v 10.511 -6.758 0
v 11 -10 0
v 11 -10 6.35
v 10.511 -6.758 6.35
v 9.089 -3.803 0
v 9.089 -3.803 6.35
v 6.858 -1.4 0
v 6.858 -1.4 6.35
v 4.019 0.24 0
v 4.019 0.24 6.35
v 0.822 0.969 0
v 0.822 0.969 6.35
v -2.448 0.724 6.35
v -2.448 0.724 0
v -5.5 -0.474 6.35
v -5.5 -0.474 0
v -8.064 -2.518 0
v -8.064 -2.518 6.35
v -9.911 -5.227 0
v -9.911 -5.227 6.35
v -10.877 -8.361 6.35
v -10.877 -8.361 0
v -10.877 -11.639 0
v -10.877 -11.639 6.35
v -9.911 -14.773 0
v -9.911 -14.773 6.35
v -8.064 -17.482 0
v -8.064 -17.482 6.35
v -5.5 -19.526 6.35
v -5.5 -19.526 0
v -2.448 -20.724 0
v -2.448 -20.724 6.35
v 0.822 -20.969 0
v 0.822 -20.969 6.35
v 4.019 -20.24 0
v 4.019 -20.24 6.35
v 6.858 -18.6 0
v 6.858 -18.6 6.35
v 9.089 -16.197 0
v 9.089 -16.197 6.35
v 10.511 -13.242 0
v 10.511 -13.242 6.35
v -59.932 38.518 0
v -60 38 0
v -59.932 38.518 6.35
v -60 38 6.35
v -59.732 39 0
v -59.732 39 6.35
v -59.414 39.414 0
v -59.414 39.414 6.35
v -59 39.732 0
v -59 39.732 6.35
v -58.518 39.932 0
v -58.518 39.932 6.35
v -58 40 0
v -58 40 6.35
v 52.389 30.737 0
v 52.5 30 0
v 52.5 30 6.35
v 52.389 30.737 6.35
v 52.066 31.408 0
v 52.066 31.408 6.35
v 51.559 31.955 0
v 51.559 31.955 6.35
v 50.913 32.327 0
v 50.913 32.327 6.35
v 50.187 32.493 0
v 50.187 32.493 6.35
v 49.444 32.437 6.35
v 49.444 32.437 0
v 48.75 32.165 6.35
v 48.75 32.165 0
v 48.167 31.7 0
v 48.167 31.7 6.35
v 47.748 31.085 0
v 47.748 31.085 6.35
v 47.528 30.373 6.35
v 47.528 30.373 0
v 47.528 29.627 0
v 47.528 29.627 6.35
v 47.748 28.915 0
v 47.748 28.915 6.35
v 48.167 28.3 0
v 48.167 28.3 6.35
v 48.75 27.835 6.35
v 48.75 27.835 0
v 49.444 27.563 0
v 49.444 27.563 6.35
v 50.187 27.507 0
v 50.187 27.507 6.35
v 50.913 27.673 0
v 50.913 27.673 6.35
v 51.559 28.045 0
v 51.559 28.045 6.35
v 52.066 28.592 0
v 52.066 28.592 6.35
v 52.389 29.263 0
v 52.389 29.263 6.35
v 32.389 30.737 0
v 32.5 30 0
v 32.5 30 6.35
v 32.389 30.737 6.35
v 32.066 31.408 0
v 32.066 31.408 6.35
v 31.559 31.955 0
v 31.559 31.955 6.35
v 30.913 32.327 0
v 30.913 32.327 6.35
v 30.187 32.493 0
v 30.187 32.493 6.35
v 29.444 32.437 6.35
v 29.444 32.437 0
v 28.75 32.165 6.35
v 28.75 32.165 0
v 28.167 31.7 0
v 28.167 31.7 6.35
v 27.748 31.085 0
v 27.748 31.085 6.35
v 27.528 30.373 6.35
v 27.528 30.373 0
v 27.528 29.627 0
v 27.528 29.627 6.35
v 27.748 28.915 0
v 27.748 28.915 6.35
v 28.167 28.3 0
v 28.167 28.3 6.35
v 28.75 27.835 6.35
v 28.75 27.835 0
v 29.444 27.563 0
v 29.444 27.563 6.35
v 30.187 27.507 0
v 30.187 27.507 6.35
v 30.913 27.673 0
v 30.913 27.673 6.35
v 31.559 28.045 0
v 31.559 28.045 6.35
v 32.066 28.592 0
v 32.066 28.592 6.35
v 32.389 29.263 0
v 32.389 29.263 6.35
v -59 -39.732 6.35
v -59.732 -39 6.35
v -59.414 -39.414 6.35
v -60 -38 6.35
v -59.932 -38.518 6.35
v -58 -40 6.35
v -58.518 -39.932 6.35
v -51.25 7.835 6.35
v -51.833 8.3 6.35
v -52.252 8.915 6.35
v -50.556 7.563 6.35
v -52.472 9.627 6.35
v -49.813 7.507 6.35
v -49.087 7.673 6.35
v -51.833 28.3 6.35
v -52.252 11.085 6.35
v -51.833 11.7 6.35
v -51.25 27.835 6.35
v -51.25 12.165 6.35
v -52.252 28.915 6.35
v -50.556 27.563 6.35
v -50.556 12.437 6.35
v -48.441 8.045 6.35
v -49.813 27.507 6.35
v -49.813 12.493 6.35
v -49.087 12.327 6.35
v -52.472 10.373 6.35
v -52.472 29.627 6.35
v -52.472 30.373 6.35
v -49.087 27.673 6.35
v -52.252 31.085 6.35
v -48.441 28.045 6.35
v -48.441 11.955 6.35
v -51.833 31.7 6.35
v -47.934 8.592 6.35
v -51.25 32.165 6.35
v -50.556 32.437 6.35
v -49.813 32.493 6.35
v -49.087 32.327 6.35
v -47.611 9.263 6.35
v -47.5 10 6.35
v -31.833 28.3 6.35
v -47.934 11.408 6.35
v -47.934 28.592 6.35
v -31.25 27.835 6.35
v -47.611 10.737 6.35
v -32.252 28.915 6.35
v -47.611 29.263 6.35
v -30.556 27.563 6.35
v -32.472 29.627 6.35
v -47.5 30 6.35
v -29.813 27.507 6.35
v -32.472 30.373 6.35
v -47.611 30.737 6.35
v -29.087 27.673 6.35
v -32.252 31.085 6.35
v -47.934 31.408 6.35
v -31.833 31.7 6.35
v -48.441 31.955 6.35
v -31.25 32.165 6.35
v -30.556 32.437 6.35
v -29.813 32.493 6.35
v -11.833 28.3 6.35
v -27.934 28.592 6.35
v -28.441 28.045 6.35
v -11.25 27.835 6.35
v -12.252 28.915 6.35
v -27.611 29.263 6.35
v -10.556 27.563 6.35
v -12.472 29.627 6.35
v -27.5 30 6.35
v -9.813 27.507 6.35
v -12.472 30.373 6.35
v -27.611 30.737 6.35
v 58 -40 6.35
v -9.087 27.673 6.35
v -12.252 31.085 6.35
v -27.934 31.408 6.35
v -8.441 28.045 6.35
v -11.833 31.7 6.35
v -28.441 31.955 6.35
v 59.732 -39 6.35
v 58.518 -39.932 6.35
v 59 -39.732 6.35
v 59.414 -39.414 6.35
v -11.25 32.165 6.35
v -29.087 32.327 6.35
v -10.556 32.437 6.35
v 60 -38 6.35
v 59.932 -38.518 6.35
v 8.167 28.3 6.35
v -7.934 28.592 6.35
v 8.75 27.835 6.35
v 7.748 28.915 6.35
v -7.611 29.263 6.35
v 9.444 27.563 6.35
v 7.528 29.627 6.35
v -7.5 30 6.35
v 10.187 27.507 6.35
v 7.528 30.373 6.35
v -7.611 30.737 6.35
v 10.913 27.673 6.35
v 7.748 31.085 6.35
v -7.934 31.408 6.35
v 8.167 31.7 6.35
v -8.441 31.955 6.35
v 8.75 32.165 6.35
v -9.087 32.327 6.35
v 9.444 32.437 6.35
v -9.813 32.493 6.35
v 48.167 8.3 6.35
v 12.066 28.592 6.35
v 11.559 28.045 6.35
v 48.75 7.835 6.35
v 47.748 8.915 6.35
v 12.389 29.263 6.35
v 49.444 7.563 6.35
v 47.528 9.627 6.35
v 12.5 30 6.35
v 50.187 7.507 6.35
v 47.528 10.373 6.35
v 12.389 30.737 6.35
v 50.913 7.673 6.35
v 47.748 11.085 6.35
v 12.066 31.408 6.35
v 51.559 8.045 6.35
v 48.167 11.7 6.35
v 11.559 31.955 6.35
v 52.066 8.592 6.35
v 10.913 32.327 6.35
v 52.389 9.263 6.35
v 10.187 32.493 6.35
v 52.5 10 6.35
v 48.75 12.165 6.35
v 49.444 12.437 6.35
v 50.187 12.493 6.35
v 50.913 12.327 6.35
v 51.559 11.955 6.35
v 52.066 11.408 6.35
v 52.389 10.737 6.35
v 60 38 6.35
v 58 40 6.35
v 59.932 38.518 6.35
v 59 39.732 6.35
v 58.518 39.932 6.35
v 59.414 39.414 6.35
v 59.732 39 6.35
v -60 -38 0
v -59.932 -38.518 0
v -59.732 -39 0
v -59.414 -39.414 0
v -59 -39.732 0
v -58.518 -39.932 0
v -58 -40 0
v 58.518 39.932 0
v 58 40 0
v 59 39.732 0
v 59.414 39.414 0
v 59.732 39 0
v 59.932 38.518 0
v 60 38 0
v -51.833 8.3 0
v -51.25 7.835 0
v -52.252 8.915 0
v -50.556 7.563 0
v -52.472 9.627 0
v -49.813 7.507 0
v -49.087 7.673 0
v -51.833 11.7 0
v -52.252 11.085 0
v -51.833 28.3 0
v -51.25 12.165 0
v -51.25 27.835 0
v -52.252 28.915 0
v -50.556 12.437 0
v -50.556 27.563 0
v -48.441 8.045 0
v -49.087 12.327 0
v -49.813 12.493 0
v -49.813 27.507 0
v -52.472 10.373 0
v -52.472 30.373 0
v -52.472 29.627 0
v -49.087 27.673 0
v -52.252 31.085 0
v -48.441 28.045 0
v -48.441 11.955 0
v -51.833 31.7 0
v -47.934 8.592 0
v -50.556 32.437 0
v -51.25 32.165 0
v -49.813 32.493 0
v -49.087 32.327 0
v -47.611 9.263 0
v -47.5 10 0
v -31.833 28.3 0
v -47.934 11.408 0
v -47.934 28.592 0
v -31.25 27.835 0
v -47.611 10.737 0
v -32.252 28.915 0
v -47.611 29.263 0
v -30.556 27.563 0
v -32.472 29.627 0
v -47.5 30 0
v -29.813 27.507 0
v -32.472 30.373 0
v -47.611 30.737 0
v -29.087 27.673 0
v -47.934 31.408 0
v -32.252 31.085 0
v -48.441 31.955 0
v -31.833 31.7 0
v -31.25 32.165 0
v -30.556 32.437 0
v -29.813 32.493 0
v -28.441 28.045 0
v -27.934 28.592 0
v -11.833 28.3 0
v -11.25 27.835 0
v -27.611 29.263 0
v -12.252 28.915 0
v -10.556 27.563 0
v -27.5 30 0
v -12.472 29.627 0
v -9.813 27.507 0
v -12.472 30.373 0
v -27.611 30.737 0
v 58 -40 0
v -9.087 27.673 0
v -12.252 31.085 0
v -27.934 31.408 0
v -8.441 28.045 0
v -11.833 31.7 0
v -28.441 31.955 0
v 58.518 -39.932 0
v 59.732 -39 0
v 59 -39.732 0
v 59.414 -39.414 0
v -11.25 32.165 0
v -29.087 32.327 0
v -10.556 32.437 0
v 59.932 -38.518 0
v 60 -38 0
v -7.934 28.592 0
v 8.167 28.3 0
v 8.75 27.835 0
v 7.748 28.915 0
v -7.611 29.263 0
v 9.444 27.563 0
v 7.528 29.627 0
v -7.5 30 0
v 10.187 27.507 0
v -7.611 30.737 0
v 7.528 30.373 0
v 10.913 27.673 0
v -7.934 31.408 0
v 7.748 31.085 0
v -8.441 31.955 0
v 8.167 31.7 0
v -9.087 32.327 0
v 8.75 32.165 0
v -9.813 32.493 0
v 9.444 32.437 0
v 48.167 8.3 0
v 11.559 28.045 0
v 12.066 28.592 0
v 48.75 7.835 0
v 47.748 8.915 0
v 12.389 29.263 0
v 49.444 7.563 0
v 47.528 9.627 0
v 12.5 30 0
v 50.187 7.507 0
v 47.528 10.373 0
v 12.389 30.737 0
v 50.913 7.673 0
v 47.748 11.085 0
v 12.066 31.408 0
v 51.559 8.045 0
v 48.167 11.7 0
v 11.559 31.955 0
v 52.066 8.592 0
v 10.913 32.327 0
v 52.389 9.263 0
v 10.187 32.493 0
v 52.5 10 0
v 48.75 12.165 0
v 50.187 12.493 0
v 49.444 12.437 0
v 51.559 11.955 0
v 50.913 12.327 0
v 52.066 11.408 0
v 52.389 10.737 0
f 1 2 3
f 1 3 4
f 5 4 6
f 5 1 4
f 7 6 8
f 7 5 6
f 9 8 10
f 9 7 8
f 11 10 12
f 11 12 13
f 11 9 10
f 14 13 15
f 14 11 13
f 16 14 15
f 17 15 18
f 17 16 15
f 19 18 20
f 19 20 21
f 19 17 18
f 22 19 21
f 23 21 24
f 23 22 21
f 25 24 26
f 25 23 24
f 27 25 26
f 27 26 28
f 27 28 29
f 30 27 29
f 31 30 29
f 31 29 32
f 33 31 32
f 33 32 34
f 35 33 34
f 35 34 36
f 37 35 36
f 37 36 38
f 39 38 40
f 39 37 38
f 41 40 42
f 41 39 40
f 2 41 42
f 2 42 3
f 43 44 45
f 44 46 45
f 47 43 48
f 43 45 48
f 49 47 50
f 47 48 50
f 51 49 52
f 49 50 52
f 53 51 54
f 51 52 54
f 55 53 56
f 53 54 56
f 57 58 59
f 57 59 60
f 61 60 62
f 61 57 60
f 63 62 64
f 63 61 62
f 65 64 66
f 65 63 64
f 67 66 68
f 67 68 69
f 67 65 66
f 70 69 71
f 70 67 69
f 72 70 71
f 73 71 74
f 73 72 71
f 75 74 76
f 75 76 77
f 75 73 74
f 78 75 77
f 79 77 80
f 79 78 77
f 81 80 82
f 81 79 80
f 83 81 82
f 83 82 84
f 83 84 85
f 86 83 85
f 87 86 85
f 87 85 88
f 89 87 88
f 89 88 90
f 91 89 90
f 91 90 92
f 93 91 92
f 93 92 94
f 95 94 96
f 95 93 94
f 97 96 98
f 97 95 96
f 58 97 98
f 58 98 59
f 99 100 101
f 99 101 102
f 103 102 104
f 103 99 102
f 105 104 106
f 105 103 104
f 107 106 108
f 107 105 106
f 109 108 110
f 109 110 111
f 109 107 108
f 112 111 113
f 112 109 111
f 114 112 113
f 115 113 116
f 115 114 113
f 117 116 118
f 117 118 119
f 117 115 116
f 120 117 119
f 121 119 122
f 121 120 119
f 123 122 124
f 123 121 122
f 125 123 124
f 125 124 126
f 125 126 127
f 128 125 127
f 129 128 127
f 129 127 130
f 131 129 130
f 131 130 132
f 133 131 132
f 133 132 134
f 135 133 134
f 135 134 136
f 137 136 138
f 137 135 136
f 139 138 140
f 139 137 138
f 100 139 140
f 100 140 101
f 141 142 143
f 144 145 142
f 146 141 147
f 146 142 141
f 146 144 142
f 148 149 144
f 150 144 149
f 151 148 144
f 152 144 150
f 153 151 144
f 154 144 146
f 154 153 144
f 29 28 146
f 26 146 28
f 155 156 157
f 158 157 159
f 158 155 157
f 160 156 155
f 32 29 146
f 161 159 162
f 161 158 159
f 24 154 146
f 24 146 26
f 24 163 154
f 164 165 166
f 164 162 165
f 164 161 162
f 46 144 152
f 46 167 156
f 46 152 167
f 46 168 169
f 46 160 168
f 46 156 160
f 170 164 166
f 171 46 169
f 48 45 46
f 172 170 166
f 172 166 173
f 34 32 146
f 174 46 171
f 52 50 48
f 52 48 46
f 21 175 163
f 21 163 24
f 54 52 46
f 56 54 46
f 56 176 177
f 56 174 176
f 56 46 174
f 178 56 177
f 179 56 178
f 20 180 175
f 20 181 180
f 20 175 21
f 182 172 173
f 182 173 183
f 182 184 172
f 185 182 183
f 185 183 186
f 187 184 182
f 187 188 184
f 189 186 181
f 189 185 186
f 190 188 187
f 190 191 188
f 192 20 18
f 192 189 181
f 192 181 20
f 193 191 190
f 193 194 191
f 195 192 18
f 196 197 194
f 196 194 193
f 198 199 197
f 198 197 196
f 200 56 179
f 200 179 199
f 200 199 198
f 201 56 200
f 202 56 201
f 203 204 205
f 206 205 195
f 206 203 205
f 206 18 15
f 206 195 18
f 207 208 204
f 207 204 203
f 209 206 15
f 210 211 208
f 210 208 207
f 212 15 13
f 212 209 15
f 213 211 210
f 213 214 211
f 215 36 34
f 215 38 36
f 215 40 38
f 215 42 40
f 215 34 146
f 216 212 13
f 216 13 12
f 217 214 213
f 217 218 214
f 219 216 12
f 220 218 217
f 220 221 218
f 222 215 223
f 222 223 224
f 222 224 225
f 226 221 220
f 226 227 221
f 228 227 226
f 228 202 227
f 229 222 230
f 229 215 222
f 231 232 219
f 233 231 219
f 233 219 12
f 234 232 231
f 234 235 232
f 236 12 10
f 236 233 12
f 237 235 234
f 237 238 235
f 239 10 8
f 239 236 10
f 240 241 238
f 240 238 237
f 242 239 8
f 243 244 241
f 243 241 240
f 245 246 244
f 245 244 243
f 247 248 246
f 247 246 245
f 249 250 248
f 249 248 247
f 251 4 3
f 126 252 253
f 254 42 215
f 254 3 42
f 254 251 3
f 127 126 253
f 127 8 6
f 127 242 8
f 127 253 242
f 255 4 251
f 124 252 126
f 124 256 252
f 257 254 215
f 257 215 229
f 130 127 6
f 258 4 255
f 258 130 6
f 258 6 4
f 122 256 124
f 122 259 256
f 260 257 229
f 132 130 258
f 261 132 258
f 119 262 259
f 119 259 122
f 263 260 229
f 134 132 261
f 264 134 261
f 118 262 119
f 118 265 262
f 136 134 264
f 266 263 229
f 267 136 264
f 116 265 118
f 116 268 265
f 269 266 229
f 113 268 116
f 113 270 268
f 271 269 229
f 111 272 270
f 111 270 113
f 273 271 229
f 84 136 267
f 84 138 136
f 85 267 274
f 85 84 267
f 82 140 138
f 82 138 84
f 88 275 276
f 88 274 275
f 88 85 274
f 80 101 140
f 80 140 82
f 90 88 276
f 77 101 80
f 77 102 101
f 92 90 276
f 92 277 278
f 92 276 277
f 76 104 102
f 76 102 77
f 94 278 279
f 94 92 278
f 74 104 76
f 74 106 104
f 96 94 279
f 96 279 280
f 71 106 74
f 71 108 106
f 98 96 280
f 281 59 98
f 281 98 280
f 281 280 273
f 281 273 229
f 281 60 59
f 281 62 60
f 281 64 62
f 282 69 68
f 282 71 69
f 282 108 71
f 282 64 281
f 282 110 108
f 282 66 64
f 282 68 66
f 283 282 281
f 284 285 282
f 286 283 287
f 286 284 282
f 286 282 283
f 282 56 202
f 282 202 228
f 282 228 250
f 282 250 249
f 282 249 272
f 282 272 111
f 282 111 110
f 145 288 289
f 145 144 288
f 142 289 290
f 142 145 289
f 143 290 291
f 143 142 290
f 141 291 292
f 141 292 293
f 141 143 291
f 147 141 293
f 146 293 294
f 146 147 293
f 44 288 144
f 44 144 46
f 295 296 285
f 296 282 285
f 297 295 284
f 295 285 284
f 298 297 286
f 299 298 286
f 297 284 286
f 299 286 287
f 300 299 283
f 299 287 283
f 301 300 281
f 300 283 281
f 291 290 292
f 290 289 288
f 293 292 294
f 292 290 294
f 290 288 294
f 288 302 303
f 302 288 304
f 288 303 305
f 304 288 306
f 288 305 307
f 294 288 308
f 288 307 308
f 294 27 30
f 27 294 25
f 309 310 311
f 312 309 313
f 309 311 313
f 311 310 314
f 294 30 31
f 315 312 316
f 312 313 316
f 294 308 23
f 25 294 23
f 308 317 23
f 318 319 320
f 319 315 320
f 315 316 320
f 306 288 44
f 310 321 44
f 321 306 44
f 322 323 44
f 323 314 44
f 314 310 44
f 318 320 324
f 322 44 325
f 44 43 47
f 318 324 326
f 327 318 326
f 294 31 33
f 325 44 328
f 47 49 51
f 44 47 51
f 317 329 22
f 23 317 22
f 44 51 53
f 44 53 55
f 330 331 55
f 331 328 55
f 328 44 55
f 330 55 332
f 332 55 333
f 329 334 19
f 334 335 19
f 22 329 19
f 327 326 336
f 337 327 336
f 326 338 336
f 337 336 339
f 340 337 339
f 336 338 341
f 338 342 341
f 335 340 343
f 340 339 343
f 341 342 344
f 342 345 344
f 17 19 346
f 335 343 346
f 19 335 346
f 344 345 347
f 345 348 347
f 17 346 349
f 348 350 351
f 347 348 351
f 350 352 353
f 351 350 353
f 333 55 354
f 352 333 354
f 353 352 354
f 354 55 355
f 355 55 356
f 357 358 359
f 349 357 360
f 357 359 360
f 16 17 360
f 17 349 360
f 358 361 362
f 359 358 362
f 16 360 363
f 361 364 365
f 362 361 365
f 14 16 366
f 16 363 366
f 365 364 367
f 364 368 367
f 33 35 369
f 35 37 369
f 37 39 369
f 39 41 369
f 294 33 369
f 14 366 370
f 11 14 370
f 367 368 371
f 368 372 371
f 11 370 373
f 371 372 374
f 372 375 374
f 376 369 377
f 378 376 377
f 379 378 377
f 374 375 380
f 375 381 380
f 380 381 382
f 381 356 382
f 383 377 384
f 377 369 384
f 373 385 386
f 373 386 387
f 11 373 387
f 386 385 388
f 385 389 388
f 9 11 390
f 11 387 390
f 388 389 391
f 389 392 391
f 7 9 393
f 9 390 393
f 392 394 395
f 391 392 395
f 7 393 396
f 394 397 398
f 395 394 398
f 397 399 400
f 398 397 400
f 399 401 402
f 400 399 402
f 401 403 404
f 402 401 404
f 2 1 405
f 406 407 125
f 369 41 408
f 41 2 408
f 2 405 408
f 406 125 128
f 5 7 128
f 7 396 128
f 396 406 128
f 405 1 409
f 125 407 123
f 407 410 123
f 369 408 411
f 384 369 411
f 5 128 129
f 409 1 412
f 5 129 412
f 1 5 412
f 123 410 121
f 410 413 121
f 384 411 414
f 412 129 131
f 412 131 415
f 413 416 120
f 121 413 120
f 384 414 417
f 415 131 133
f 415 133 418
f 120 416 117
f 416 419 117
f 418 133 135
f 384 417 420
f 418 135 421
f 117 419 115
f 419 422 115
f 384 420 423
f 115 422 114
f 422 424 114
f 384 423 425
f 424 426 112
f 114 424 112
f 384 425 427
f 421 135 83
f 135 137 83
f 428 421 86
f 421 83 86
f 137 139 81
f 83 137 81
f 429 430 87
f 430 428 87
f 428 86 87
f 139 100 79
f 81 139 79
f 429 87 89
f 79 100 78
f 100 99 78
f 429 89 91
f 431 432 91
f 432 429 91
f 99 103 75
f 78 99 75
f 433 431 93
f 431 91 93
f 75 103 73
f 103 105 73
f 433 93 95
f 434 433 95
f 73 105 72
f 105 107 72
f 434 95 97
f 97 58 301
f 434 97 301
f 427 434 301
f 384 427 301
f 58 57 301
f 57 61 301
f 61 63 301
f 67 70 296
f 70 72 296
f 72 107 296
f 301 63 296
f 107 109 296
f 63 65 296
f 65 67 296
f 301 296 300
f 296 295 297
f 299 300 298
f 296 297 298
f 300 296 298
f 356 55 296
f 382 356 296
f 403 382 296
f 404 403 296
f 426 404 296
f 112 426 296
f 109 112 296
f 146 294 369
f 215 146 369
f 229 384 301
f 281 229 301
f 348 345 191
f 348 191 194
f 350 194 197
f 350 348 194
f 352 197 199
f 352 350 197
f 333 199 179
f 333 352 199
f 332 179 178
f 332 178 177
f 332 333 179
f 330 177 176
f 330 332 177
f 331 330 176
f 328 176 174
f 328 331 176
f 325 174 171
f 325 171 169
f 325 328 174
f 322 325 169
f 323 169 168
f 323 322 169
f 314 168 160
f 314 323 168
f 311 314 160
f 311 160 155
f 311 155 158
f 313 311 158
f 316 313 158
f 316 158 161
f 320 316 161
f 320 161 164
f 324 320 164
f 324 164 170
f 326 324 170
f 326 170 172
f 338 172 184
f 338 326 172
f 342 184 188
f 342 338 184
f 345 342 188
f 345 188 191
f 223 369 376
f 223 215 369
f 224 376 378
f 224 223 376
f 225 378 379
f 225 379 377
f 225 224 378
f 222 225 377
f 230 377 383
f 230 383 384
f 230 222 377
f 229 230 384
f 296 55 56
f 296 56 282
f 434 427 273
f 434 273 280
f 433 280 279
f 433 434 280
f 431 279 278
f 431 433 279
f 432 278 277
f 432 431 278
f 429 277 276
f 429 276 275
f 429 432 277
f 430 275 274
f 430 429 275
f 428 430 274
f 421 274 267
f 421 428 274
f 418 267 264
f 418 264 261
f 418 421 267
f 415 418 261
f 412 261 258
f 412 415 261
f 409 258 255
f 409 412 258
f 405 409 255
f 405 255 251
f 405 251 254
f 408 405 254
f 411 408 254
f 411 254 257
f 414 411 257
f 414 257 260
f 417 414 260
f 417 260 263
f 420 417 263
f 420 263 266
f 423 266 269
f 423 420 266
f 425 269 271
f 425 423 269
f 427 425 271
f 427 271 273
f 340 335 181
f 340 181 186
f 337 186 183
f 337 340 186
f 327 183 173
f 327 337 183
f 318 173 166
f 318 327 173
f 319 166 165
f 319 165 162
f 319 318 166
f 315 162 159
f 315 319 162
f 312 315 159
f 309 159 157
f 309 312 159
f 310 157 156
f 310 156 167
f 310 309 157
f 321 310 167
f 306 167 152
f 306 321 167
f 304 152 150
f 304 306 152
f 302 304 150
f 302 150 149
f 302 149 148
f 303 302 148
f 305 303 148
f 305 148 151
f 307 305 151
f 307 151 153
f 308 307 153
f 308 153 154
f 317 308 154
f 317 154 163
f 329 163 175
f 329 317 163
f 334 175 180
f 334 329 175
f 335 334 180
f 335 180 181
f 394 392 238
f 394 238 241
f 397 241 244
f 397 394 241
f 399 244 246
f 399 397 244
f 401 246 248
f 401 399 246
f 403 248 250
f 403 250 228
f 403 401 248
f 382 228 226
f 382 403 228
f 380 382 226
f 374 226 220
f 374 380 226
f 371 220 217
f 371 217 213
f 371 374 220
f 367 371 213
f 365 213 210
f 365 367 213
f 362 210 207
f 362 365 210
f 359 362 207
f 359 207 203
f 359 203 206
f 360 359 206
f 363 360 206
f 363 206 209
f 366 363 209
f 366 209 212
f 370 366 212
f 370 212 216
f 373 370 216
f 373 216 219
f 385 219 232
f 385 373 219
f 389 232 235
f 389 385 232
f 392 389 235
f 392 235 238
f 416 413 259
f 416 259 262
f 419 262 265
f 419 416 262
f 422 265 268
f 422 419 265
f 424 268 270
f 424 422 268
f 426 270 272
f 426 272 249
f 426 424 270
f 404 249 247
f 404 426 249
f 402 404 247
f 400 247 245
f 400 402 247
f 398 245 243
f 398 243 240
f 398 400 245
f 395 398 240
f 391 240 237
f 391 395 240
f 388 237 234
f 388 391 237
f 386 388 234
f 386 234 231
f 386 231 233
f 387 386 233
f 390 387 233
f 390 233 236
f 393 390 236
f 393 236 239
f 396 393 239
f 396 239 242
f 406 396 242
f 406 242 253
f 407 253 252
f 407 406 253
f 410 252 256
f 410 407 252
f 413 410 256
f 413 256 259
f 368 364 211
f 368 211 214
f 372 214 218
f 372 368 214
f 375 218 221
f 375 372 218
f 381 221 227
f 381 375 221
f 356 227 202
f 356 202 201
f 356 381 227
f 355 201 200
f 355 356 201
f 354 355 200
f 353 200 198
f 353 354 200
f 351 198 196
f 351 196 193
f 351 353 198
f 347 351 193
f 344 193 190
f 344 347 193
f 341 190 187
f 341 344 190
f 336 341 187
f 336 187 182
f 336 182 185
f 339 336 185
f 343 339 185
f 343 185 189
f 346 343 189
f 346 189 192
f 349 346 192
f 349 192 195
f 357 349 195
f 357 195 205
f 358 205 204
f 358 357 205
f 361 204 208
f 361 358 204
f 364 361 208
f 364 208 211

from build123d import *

# Parameters (mm, degrees)
SKETCH1_W           = 120
SKETCH1_H           = 80
SKETCH1_R           = 2.5
SKETCH1_R_2         = 11
BOSS_EXTRUDE1_DEPTH = 6.35
FILLET1_R           = 2


with BuildPart() as part:
    # Sketch1 → Boss-Extrude1 (new body)
    with BuildSketch(Plane.XY):
        Rectangle(SKETCH1_W, SKETCH1_H)
        with Locations((-50, 30)):
            Circle(SKETCH1_R, mode=Mode.SUBTRACT)
        with Locations((-30, 30)):
            Circle(SKETCH1_R, mode=Mode.SUBTRACT)
        with Locations((-10, 30)):
            Circle(SKETCH1_R, mode=Mode.SUBTRACT)
        with Locations((10, 30)):
            Circle(SKETCH1_R, mode=Mode.SUBTRACT)
        with Locations((30, 30)):
            Circle(SKETCH1_R, mode=Mode.SUBTRACT)
        with Locations((50, 30)):
            Circle(SKETCH1_R, mode=Mode.SUBTRACT)
        with Locations((-50, 10)):
            Circle(SKETCH1_R, mode=Mode.SUBTRACT)
        with Locations((50, 10)):
            Circle(SKETCH1_R, mode=Mode.SUBTRACT)
        with Locations((0, -10)):
            Circle(SKETCH1_R_2, mode=Mode.SUBTRACT)
    extrude(amount=BOSS_EXTRUDE1_DEPTH)

    # Fillet1
    fillet1_edges = [part.edges().sort_by_distance(p)[0] for p in [
        (60, -40, 3.175),
        (-60, -40, 3.175),
        (-60, 40, 3.175),
        (60, 40, 3.175),
    ]]
    fillet(fillet1_edges, radius=FILLET1_R)


solid = part.part
